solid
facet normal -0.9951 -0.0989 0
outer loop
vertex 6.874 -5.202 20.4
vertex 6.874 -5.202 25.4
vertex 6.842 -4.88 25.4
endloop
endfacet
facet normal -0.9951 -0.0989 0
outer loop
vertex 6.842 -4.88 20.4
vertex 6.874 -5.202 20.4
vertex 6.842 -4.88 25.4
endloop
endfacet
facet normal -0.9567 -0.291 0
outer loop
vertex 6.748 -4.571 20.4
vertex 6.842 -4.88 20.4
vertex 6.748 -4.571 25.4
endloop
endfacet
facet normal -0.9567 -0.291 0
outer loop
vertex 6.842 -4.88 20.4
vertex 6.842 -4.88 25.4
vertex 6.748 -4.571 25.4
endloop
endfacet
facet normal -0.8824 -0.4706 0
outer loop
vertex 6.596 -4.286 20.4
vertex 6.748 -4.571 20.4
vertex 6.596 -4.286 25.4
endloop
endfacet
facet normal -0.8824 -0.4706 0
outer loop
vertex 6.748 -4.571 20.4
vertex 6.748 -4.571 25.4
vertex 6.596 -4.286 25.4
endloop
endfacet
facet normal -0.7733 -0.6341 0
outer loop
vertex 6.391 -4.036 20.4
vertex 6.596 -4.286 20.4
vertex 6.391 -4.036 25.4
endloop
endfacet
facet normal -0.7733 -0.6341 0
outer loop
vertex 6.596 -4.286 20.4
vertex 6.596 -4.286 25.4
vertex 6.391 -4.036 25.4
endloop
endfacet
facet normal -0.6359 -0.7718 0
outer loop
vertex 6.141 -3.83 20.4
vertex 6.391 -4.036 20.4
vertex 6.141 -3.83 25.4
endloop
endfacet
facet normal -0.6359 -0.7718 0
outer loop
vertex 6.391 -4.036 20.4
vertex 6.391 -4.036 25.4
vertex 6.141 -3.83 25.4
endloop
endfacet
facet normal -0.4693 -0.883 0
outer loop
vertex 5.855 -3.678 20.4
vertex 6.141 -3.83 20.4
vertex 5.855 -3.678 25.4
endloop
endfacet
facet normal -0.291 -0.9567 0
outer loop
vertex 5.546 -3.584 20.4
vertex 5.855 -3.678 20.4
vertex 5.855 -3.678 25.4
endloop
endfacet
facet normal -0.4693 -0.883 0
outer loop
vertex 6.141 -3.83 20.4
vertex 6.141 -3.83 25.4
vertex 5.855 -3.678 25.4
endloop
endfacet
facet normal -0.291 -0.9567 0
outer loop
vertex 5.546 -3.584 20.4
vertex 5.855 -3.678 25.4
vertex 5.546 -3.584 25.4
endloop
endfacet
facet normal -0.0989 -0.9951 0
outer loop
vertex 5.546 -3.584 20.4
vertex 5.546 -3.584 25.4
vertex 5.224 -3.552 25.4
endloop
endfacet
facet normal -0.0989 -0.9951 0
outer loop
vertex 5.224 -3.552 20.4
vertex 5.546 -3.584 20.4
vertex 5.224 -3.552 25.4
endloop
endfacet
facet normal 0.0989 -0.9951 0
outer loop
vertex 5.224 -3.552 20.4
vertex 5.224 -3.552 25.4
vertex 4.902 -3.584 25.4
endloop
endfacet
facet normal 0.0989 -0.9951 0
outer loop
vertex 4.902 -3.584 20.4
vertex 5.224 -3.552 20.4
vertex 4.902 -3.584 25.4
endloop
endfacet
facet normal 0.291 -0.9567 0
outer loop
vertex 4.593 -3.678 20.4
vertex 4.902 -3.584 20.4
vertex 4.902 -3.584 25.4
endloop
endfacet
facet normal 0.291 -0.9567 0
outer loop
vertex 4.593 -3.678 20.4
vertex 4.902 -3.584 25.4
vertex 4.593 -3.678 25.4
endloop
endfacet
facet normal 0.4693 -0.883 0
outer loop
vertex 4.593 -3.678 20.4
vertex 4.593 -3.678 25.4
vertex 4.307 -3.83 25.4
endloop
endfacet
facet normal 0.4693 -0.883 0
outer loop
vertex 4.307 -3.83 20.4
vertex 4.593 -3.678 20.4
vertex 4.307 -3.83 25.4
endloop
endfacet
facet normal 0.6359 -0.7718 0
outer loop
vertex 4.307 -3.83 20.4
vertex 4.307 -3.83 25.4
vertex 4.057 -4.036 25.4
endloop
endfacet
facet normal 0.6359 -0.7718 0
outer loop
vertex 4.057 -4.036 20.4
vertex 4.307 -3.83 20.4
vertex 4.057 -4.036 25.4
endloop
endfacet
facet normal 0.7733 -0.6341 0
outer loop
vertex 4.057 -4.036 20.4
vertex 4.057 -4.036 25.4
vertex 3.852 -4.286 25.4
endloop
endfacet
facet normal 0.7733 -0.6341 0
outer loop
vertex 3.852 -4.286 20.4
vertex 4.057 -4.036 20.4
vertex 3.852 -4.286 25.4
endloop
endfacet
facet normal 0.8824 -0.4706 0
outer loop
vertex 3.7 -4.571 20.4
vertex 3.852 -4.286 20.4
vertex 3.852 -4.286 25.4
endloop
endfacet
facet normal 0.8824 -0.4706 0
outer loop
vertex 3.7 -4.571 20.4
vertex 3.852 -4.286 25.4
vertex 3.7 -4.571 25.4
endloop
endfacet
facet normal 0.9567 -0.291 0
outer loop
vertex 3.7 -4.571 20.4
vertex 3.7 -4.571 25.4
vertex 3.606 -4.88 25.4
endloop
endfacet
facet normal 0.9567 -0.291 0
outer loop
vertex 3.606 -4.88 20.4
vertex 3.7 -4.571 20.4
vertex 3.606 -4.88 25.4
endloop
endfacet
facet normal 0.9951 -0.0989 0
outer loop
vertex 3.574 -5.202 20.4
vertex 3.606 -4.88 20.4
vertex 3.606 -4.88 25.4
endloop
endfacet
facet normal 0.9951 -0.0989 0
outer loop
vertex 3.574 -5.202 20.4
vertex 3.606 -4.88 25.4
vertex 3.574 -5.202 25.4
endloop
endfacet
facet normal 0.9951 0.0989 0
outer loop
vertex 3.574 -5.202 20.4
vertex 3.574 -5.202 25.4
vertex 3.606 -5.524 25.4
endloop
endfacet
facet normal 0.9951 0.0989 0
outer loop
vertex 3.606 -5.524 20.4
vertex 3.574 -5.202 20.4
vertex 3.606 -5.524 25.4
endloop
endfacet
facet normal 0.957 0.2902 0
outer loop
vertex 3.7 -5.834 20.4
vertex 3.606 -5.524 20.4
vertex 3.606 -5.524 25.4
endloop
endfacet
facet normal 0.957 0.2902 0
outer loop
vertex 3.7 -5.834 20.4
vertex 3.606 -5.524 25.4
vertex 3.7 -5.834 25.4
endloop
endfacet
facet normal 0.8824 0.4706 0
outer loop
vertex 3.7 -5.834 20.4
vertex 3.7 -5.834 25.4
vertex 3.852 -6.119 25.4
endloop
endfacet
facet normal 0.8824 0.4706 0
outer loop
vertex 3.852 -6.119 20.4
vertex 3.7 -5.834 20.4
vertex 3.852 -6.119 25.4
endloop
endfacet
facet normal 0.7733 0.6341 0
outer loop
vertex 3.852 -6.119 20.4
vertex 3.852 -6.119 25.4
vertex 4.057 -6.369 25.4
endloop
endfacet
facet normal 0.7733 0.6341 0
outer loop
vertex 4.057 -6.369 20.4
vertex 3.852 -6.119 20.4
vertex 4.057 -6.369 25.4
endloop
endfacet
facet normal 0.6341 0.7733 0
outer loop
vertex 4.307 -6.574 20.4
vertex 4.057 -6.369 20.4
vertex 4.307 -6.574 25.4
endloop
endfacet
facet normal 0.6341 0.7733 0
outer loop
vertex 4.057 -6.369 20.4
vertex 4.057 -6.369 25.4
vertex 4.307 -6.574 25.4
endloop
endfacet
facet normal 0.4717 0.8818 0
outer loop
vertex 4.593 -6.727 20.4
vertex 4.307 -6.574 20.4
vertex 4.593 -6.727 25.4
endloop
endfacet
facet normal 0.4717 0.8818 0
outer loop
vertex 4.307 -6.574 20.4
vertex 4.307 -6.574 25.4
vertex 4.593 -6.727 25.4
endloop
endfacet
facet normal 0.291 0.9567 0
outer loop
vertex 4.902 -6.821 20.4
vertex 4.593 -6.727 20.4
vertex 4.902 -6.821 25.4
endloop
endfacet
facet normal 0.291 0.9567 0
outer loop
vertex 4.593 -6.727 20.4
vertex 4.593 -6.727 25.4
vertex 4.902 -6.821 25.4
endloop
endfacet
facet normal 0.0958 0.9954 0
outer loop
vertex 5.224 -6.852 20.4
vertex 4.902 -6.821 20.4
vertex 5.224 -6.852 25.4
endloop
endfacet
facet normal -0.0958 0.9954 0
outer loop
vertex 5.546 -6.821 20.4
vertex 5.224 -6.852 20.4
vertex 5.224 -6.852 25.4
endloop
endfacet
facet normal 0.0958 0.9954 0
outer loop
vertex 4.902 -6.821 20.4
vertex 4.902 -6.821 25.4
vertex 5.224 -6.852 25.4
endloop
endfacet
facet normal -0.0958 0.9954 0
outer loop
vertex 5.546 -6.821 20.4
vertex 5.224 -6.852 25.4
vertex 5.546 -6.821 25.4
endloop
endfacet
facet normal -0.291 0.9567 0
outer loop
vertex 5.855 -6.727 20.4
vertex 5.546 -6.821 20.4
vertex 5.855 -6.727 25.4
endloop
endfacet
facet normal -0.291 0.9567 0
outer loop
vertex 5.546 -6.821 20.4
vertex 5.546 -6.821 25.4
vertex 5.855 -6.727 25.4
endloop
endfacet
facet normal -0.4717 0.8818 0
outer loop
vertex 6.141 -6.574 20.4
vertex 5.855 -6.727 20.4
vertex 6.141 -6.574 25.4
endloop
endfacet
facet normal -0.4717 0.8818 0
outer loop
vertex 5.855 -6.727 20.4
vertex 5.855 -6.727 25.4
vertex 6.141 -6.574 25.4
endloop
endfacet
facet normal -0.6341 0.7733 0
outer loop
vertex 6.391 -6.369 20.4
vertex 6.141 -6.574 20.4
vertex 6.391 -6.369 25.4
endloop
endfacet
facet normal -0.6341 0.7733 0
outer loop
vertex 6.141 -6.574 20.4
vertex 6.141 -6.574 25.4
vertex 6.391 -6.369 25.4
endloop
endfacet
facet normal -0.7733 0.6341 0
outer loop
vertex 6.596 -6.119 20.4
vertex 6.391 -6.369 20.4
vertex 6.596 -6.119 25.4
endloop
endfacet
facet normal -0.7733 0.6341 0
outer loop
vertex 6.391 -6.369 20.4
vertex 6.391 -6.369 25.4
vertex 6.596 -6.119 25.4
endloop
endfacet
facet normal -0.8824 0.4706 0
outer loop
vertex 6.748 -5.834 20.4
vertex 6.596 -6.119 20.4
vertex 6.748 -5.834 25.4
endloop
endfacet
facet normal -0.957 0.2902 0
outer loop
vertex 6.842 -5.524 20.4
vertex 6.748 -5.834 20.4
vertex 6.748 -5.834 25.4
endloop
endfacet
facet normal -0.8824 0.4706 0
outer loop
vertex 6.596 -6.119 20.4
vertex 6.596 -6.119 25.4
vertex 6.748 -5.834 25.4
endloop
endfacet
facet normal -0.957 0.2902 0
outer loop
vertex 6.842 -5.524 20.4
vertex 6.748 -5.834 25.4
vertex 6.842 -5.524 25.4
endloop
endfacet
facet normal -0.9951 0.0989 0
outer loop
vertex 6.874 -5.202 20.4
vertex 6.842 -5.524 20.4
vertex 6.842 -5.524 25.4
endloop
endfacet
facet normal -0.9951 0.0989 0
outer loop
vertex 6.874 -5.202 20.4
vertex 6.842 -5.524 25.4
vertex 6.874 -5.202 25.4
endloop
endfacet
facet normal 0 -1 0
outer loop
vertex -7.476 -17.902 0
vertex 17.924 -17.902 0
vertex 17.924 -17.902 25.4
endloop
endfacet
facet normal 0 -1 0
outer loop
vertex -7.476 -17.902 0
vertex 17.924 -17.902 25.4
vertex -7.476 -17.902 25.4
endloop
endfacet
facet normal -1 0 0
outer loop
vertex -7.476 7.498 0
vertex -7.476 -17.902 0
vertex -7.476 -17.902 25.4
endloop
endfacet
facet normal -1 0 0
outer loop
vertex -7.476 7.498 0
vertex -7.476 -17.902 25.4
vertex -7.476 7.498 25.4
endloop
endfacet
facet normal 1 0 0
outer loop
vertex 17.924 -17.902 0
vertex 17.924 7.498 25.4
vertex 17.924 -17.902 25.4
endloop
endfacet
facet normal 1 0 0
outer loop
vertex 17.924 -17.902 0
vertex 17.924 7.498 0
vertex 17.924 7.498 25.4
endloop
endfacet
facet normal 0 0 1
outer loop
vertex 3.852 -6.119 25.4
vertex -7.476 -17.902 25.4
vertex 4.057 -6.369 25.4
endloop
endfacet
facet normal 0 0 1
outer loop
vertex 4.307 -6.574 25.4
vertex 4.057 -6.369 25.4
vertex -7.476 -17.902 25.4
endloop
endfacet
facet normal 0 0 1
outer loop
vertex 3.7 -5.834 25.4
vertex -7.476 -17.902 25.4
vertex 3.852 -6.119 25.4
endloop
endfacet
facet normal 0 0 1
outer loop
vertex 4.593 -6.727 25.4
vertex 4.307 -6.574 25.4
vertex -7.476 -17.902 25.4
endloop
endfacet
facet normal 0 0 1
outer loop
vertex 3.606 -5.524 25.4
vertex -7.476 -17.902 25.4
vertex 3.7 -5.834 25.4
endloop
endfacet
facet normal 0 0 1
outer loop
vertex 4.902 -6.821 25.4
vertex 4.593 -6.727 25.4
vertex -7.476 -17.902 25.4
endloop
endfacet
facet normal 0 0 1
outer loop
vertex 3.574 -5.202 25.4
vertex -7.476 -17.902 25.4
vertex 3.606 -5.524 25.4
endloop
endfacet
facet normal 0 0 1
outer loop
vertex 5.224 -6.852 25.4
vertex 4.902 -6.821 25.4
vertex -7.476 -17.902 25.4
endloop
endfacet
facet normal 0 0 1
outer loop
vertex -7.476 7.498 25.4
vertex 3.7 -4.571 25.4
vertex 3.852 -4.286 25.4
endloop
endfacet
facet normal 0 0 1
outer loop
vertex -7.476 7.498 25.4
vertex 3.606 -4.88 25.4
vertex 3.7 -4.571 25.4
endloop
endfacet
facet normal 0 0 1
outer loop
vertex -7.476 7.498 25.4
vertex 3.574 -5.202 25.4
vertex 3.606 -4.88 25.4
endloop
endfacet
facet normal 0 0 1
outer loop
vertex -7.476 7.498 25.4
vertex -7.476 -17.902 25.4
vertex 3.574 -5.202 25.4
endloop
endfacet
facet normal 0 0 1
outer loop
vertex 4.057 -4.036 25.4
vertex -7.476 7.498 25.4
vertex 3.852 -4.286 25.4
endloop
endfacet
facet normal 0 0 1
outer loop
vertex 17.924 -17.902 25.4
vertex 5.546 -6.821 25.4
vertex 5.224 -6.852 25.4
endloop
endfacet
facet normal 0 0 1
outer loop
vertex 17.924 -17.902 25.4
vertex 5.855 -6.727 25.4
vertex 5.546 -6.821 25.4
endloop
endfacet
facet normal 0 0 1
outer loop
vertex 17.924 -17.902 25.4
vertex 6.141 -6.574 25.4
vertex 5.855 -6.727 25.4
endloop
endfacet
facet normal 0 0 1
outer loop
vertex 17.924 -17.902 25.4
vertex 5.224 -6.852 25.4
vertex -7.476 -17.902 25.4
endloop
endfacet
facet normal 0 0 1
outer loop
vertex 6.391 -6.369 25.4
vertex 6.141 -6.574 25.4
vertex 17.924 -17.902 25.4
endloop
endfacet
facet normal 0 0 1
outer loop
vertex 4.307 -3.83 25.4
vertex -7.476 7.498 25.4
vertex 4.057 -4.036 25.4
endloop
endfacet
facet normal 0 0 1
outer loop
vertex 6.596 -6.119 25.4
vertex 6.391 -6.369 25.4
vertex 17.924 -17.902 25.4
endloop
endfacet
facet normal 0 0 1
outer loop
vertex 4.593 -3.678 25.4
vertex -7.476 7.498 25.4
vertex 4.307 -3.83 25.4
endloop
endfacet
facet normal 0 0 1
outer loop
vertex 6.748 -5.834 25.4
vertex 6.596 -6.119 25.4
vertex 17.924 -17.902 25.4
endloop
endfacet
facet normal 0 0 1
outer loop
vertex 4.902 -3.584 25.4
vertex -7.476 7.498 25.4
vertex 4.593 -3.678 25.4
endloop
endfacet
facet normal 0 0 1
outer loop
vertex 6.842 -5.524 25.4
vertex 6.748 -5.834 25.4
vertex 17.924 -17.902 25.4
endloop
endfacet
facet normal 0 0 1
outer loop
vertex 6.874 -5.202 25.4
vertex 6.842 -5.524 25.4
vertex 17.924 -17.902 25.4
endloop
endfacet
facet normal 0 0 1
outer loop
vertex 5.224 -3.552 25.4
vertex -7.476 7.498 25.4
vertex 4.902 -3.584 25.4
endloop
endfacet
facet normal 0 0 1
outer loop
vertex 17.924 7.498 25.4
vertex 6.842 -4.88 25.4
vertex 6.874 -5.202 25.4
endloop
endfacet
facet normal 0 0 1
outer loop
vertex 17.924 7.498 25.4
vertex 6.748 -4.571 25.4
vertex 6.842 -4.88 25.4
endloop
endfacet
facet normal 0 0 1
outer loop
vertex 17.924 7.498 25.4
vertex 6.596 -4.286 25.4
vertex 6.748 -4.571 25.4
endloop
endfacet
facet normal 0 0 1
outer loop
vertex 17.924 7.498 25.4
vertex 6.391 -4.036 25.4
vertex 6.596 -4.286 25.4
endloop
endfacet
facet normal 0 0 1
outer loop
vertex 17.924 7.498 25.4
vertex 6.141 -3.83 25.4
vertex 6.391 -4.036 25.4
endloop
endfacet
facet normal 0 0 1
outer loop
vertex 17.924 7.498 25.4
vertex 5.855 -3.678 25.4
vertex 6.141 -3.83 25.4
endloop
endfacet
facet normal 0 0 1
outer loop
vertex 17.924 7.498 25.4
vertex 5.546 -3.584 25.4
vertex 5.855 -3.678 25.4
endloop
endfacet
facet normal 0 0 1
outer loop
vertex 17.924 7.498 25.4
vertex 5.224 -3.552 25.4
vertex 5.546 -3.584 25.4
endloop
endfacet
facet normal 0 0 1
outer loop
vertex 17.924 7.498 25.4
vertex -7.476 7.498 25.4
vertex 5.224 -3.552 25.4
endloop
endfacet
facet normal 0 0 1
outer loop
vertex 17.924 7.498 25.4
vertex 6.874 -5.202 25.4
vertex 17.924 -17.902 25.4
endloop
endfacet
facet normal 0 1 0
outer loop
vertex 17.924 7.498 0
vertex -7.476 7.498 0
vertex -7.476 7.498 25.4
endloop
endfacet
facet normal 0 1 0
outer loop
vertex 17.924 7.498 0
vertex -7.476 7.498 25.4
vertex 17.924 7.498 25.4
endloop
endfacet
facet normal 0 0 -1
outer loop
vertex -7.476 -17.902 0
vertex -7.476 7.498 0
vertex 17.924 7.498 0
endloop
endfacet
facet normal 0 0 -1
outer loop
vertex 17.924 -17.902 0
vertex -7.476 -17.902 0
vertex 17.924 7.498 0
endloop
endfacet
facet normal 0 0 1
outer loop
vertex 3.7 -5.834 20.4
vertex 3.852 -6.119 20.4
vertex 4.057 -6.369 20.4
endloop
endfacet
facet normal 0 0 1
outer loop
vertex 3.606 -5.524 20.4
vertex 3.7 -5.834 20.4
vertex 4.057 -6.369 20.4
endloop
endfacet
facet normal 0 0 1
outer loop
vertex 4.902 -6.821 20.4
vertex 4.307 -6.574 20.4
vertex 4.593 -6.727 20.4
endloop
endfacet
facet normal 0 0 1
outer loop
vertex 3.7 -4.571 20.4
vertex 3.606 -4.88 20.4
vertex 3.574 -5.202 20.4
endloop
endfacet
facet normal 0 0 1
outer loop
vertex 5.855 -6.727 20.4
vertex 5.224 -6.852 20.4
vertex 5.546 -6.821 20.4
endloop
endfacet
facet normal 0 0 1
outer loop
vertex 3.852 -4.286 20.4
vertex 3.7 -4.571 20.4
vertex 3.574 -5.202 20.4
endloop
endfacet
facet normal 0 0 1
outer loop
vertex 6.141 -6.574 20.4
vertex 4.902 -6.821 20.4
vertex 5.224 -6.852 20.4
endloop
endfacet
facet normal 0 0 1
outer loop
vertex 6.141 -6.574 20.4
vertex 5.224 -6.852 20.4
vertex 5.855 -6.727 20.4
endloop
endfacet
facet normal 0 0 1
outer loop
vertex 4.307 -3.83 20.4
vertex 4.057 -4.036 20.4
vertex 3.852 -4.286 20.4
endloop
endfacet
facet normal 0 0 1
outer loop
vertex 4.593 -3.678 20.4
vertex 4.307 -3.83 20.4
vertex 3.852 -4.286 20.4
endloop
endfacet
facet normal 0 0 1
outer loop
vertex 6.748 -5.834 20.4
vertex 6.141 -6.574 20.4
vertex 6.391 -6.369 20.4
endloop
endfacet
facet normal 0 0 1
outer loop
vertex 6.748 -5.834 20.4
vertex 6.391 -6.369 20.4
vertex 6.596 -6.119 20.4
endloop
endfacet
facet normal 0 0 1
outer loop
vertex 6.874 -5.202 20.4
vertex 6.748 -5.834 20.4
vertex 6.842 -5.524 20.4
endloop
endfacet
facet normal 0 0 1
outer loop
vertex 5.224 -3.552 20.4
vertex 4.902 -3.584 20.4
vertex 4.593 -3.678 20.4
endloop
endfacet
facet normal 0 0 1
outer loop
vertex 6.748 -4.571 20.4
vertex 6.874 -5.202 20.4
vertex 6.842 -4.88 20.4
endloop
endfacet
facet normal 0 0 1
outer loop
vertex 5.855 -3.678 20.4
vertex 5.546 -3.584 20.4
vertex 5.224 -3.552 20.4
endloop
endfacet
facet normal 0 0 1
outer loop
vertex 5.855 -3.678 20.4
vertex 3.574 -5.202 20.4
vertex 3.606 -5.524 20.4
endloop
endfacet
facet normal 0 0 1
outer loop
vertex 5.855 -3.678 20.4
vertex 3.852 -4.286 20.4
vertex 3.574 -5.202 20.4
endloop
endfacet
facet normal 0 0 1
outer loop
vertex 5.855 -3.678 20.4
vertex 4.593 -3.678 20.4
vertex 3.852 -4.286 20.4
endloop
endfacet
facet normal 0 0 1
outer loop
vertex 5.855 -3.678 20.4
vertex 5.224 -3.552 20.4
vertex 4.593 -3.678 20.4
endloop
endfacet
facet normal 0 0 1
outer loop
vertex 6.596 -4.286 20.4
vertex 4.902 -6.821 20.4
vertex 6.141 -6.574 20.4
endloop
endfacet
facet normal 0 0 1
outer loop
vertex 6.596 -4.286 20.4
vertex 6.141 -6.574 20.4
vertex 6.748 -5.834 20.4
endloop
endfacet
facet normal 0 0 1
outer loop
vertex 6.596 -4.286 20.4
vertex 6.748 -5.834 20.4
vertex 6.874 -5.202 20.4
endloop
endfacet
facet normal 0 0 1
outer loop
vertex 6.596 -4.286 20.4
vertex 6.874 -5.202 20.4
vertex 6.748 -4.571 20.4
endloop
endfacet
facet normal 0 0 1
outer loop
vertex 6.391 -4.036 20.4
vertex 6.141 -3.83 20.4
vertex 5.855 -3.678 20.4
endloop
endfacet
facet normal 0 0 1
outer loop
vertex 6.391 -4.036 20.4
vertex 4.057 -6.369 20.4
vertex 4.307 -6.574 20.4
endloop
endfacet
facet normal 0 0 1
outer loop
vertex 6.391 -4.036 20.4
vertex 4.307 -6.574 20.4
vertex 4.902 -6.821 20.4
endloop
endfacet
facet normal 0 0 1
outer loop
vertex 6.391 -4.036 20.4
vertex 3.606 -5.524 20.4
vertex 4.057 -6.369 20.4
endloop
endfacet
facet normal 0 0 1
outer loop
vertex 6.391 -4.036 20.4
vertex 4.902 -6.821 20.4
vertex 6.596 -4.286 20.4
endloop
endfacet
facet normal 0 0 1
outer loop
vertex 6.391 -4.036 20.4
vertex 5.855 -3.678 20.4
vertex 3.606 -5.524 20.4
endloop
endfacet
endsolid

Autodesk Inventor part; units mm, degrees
ref_plane "YZ Plane" through (0, 0, 0) normal (1, 0, 0) x (0, 1, 0)
ref_plane "XZ Plane" through (0, 0, 0) normal (0, 1, 0) x (-1, 0, 0)
ref_plane "XY Plane" through (0, 0, 0) normal (0, 0, 1) x (1, 0, 0)
sketch "Sketch1" plane through (0, 0, 0) normal (0, 0, 1) x (1, 0, 0)
  line L0 (-7.476, 7.4977) -> (17.924, 7.4977)
  line L1 (17.924, 7.4977) -> (17.924, -17.9023)
  line L2 (17.924, -17.9023) -> (-7.476, -17.9023)
  line L3 (-7.476, -17.9023) -> (-7.476, 7.4977)
  point P0 (0, 0)
  dimension "d0" = 25.4
  dimension "d1" = 25.4
extrude "Extrusion1" add sketch "Sketch1" along normal blind 25.4
sketch "Sketch2" plane through (0, 0, 25.4) normal (0, 0, 1) x (1, 0, 0)
  line L0 (17.924, 7.4977) -> (-7.476, 7.4977) projected
  line L1 (-7.476, -17.9023) -> (17.924, -17.9023) projected
  line L2 (-7.476, 7.4977) -> (17.924, -17.9023) construction
  line L3 (-7.476, 7.4977) -> (-7.476, -17.9023) projected
  line L4 (17.924, 7.4977) -> (-7.476, -17.9023) construction
  circle A0 centre (5.224, -5.2023) radius 1.65
  point P0 (0, 0)
  dimension "d4" = 3.3
extrude "Extrusion2" cut sketch "Sketch2" against normal blind 5
properties part number "Motor test mount"
